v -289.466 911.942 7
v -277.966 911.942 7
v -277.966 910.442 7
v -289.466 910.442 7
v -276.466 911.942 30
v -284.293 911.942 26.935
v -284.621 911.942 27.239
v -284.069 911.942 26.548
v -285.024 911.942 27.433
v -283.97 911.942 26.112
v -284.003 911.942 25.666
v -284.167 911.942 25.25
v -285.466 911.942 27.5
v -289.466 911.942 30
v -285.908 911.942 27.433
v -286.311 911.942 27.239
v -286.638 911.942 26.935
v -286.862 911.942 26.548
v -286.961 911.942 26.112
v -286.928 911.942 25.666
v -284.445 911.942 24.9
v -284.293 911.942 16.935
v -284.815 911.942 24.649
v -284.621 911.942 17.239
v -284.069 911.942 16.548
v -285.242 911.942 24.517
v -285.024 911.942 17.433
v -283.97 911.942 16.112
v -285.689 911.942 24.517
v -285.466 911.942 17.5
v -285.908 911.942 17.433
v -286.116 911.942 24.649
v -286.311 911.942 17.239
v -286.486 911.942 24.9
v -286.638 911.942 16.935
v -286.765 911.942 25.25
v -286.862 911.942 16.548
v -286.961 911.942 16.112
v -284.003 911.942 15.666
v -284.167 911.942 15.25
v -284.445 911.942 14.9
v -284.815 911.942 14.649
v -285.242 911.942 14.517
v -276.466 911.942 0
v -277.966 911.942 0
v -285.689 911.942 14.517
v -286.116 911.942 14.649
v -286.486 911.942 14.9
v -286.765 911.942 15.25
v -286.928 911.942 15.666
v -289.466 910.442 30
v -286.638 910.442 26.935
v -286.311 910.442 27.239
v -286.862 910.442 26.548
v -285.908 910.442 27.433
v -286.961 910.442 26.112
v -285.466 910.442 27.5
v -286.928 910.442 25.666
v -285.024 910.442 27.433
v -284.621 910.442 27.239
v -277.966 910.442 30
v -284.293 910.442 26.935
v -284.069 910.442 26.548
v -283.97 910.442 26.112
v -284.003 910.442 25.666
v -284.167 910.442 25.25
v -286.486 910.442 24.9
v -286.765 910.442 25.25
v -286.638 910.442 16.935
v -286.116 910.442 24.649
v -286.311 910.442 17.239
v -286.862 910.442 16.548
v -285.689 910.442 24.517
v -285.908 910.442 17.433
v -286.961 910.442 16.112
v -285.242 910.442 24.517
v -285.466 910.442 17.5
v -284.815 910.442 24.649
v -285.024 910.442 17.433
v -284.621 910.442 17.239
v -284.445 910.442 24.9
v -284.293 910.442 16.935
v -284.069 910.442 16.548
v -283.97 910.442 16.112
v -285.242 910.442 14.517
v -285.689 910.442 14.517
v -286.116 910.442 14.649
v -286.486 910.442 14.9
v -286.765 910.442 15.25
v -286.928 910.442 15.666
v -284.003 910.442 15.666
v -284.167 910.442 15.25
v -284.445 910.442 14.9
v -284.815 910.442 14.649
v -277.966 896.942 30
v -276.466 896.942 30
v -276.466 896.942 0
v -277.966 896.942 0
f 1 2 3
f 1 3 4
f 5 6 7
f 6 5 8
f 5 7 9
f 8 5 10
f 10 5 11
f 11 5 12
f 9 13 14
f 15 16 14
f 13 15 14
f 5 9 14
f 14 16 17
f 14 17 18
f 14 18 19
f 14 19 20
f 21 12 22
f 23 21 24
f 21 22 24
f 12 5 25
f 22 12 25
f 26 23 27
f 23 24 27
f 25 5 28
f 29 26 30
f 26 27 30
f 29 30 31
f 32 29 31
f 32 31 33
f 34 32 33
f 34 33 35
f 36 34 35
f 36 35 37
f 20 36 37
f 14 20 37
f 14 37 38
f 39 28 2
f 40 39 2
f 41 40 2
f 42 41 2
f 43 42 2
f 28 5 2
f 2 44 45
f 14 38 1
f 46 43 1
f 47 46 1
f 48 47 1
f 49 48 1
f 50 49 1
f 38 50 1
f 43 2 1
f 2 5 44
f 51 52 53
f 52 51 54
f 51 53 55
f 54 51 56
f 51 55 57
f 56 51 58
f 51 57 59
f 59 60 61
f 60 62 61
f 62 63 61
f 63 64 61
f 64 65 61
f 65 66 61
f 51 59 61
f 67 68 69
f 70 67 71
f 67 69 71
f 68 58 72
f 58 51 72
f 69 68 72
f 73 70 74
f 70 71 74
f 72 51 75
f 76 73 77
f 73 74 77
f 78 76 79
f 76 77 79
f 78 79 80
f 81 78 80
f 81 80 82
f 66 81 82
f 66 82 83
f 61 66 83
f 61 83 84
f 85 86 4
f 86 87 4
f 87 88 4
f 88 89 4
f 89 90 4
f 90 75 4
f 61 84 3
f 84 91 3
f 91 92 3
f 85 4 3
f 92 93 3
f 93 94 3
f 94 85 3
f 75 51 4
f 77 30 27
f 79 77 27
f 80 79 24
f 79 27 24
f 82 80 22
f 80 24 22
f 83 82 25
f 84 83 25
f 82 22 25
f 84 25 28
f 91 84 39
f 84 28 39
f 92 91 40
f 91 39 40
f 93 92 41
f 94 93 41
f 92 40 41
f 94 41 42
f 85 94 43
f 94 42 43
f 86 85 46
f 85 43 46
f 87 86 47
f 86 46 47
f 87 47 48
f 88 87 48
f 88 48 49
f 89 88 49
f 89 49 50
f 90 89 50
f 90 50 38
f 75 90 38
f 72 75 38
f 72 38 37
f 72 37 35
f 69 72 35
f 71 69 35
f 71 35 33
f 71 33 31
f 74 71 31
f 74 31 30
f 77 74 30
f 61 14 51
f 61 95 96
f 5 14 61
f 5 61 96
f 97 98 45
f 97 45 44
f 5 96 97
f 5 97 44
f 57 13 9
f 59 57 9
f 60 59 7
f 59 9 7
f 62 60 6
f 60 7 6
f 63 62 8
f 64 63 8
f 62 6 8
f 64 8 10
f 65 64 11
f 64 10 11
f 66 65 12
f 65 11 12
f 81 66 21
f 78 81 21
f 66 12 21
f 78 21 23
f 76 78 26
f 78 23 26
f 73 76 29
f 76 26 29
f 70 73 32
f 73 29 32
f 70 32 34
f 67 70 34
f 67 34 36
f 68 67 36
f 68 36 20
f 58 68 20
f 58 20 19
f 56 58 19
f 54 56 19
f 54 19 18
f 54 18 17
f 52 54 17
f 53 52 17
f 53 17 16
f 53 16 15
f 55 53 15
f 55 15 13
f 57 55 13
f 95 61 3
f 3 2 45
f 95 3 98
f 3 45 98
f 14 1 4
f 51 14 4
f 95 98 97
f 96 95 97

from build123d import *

# Parameters (mm, degrees)
EXTRUSION1_DEPTH = 30
ESQUISSE2_R      = 1.5
ESQUISSE2_W      = 11.5
ESQUISSE2_H      = 7
EXTRUSION2_DEPTH = 30


with BuildPart() as part:
    # Esquisse1 → Extrusion1 (new body)
    with BuildSketch(Plane.XY):
        Polygon((-276.465646311, 896.941960338), (-276.465646311, 911.941960338), (-289.465646311, 911.941960338), (-289.465646311, 910.441960338), (-277.965646311, 910.441960338), (-277.965646311, 896.941960338), align=None)
    extrude(amount=EXTRUSION1_DEPTH)

    # Esquisse2 → Extrusion2 (cut)
    with BuildSketch(Plane(origin=(0, 911.941960338, 0), x_dir=(-1, 0, 0), z_dir=(0, 1, 0))):
        with Locations(Location((285.465646311, 16, 0), (0, 0, 90))):
            Circle(ESQUISSE2_R)
        with Locations(Location((285.465646311, 26, 0), (0, 0, 90))):
            Circle(ESQUISSE2_R)
        with Locations((283.715646311, 3.5)):
            Rectangle(ESQUISSE2_W, ESQUISSE2_H)
    extrude(amount=-EXTRUSION2_DEPTH, mode=Mode.SUBTRACT)


solid = part.part
